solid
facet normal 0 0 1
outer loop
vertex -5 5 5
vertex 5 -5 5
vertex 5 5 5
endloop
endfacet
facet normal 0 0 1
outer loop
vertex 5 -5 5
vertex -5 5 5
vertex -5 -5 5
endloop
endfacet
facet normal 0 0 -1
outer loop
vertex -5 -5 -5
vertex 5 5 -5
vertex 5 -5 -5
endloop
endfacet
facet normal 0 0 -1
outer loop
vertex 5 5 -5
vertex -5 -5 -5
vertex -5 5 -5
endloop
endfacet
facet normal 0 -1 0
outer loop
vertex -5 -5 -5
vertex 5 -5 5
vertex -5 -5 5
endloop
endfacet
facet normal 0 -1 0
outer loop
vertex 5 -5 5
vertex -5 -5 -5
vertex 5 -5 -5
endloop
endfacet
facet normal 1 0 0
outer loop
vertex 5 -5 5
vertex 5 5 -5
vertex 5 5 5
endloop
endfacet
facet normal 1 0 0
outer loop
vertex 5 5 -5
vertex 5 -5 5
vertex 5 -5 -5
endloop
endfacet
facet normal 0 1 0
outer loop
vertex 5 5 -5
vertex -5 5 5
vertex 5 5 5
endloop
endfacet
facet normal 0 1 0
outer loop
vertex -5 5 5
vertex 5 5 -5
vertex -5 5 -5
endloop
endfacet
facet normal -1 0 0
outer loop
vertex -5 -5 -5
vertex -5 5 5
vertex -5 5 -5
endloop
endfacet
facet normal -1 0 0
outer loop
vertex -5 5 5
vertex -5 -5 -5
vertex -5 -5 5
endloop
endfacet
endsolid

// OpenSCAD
function VescMountingHoleCentres() = [41, 79];

module VESC()
{
  cube([10, 10, 10], center=true);
}

VESC();
